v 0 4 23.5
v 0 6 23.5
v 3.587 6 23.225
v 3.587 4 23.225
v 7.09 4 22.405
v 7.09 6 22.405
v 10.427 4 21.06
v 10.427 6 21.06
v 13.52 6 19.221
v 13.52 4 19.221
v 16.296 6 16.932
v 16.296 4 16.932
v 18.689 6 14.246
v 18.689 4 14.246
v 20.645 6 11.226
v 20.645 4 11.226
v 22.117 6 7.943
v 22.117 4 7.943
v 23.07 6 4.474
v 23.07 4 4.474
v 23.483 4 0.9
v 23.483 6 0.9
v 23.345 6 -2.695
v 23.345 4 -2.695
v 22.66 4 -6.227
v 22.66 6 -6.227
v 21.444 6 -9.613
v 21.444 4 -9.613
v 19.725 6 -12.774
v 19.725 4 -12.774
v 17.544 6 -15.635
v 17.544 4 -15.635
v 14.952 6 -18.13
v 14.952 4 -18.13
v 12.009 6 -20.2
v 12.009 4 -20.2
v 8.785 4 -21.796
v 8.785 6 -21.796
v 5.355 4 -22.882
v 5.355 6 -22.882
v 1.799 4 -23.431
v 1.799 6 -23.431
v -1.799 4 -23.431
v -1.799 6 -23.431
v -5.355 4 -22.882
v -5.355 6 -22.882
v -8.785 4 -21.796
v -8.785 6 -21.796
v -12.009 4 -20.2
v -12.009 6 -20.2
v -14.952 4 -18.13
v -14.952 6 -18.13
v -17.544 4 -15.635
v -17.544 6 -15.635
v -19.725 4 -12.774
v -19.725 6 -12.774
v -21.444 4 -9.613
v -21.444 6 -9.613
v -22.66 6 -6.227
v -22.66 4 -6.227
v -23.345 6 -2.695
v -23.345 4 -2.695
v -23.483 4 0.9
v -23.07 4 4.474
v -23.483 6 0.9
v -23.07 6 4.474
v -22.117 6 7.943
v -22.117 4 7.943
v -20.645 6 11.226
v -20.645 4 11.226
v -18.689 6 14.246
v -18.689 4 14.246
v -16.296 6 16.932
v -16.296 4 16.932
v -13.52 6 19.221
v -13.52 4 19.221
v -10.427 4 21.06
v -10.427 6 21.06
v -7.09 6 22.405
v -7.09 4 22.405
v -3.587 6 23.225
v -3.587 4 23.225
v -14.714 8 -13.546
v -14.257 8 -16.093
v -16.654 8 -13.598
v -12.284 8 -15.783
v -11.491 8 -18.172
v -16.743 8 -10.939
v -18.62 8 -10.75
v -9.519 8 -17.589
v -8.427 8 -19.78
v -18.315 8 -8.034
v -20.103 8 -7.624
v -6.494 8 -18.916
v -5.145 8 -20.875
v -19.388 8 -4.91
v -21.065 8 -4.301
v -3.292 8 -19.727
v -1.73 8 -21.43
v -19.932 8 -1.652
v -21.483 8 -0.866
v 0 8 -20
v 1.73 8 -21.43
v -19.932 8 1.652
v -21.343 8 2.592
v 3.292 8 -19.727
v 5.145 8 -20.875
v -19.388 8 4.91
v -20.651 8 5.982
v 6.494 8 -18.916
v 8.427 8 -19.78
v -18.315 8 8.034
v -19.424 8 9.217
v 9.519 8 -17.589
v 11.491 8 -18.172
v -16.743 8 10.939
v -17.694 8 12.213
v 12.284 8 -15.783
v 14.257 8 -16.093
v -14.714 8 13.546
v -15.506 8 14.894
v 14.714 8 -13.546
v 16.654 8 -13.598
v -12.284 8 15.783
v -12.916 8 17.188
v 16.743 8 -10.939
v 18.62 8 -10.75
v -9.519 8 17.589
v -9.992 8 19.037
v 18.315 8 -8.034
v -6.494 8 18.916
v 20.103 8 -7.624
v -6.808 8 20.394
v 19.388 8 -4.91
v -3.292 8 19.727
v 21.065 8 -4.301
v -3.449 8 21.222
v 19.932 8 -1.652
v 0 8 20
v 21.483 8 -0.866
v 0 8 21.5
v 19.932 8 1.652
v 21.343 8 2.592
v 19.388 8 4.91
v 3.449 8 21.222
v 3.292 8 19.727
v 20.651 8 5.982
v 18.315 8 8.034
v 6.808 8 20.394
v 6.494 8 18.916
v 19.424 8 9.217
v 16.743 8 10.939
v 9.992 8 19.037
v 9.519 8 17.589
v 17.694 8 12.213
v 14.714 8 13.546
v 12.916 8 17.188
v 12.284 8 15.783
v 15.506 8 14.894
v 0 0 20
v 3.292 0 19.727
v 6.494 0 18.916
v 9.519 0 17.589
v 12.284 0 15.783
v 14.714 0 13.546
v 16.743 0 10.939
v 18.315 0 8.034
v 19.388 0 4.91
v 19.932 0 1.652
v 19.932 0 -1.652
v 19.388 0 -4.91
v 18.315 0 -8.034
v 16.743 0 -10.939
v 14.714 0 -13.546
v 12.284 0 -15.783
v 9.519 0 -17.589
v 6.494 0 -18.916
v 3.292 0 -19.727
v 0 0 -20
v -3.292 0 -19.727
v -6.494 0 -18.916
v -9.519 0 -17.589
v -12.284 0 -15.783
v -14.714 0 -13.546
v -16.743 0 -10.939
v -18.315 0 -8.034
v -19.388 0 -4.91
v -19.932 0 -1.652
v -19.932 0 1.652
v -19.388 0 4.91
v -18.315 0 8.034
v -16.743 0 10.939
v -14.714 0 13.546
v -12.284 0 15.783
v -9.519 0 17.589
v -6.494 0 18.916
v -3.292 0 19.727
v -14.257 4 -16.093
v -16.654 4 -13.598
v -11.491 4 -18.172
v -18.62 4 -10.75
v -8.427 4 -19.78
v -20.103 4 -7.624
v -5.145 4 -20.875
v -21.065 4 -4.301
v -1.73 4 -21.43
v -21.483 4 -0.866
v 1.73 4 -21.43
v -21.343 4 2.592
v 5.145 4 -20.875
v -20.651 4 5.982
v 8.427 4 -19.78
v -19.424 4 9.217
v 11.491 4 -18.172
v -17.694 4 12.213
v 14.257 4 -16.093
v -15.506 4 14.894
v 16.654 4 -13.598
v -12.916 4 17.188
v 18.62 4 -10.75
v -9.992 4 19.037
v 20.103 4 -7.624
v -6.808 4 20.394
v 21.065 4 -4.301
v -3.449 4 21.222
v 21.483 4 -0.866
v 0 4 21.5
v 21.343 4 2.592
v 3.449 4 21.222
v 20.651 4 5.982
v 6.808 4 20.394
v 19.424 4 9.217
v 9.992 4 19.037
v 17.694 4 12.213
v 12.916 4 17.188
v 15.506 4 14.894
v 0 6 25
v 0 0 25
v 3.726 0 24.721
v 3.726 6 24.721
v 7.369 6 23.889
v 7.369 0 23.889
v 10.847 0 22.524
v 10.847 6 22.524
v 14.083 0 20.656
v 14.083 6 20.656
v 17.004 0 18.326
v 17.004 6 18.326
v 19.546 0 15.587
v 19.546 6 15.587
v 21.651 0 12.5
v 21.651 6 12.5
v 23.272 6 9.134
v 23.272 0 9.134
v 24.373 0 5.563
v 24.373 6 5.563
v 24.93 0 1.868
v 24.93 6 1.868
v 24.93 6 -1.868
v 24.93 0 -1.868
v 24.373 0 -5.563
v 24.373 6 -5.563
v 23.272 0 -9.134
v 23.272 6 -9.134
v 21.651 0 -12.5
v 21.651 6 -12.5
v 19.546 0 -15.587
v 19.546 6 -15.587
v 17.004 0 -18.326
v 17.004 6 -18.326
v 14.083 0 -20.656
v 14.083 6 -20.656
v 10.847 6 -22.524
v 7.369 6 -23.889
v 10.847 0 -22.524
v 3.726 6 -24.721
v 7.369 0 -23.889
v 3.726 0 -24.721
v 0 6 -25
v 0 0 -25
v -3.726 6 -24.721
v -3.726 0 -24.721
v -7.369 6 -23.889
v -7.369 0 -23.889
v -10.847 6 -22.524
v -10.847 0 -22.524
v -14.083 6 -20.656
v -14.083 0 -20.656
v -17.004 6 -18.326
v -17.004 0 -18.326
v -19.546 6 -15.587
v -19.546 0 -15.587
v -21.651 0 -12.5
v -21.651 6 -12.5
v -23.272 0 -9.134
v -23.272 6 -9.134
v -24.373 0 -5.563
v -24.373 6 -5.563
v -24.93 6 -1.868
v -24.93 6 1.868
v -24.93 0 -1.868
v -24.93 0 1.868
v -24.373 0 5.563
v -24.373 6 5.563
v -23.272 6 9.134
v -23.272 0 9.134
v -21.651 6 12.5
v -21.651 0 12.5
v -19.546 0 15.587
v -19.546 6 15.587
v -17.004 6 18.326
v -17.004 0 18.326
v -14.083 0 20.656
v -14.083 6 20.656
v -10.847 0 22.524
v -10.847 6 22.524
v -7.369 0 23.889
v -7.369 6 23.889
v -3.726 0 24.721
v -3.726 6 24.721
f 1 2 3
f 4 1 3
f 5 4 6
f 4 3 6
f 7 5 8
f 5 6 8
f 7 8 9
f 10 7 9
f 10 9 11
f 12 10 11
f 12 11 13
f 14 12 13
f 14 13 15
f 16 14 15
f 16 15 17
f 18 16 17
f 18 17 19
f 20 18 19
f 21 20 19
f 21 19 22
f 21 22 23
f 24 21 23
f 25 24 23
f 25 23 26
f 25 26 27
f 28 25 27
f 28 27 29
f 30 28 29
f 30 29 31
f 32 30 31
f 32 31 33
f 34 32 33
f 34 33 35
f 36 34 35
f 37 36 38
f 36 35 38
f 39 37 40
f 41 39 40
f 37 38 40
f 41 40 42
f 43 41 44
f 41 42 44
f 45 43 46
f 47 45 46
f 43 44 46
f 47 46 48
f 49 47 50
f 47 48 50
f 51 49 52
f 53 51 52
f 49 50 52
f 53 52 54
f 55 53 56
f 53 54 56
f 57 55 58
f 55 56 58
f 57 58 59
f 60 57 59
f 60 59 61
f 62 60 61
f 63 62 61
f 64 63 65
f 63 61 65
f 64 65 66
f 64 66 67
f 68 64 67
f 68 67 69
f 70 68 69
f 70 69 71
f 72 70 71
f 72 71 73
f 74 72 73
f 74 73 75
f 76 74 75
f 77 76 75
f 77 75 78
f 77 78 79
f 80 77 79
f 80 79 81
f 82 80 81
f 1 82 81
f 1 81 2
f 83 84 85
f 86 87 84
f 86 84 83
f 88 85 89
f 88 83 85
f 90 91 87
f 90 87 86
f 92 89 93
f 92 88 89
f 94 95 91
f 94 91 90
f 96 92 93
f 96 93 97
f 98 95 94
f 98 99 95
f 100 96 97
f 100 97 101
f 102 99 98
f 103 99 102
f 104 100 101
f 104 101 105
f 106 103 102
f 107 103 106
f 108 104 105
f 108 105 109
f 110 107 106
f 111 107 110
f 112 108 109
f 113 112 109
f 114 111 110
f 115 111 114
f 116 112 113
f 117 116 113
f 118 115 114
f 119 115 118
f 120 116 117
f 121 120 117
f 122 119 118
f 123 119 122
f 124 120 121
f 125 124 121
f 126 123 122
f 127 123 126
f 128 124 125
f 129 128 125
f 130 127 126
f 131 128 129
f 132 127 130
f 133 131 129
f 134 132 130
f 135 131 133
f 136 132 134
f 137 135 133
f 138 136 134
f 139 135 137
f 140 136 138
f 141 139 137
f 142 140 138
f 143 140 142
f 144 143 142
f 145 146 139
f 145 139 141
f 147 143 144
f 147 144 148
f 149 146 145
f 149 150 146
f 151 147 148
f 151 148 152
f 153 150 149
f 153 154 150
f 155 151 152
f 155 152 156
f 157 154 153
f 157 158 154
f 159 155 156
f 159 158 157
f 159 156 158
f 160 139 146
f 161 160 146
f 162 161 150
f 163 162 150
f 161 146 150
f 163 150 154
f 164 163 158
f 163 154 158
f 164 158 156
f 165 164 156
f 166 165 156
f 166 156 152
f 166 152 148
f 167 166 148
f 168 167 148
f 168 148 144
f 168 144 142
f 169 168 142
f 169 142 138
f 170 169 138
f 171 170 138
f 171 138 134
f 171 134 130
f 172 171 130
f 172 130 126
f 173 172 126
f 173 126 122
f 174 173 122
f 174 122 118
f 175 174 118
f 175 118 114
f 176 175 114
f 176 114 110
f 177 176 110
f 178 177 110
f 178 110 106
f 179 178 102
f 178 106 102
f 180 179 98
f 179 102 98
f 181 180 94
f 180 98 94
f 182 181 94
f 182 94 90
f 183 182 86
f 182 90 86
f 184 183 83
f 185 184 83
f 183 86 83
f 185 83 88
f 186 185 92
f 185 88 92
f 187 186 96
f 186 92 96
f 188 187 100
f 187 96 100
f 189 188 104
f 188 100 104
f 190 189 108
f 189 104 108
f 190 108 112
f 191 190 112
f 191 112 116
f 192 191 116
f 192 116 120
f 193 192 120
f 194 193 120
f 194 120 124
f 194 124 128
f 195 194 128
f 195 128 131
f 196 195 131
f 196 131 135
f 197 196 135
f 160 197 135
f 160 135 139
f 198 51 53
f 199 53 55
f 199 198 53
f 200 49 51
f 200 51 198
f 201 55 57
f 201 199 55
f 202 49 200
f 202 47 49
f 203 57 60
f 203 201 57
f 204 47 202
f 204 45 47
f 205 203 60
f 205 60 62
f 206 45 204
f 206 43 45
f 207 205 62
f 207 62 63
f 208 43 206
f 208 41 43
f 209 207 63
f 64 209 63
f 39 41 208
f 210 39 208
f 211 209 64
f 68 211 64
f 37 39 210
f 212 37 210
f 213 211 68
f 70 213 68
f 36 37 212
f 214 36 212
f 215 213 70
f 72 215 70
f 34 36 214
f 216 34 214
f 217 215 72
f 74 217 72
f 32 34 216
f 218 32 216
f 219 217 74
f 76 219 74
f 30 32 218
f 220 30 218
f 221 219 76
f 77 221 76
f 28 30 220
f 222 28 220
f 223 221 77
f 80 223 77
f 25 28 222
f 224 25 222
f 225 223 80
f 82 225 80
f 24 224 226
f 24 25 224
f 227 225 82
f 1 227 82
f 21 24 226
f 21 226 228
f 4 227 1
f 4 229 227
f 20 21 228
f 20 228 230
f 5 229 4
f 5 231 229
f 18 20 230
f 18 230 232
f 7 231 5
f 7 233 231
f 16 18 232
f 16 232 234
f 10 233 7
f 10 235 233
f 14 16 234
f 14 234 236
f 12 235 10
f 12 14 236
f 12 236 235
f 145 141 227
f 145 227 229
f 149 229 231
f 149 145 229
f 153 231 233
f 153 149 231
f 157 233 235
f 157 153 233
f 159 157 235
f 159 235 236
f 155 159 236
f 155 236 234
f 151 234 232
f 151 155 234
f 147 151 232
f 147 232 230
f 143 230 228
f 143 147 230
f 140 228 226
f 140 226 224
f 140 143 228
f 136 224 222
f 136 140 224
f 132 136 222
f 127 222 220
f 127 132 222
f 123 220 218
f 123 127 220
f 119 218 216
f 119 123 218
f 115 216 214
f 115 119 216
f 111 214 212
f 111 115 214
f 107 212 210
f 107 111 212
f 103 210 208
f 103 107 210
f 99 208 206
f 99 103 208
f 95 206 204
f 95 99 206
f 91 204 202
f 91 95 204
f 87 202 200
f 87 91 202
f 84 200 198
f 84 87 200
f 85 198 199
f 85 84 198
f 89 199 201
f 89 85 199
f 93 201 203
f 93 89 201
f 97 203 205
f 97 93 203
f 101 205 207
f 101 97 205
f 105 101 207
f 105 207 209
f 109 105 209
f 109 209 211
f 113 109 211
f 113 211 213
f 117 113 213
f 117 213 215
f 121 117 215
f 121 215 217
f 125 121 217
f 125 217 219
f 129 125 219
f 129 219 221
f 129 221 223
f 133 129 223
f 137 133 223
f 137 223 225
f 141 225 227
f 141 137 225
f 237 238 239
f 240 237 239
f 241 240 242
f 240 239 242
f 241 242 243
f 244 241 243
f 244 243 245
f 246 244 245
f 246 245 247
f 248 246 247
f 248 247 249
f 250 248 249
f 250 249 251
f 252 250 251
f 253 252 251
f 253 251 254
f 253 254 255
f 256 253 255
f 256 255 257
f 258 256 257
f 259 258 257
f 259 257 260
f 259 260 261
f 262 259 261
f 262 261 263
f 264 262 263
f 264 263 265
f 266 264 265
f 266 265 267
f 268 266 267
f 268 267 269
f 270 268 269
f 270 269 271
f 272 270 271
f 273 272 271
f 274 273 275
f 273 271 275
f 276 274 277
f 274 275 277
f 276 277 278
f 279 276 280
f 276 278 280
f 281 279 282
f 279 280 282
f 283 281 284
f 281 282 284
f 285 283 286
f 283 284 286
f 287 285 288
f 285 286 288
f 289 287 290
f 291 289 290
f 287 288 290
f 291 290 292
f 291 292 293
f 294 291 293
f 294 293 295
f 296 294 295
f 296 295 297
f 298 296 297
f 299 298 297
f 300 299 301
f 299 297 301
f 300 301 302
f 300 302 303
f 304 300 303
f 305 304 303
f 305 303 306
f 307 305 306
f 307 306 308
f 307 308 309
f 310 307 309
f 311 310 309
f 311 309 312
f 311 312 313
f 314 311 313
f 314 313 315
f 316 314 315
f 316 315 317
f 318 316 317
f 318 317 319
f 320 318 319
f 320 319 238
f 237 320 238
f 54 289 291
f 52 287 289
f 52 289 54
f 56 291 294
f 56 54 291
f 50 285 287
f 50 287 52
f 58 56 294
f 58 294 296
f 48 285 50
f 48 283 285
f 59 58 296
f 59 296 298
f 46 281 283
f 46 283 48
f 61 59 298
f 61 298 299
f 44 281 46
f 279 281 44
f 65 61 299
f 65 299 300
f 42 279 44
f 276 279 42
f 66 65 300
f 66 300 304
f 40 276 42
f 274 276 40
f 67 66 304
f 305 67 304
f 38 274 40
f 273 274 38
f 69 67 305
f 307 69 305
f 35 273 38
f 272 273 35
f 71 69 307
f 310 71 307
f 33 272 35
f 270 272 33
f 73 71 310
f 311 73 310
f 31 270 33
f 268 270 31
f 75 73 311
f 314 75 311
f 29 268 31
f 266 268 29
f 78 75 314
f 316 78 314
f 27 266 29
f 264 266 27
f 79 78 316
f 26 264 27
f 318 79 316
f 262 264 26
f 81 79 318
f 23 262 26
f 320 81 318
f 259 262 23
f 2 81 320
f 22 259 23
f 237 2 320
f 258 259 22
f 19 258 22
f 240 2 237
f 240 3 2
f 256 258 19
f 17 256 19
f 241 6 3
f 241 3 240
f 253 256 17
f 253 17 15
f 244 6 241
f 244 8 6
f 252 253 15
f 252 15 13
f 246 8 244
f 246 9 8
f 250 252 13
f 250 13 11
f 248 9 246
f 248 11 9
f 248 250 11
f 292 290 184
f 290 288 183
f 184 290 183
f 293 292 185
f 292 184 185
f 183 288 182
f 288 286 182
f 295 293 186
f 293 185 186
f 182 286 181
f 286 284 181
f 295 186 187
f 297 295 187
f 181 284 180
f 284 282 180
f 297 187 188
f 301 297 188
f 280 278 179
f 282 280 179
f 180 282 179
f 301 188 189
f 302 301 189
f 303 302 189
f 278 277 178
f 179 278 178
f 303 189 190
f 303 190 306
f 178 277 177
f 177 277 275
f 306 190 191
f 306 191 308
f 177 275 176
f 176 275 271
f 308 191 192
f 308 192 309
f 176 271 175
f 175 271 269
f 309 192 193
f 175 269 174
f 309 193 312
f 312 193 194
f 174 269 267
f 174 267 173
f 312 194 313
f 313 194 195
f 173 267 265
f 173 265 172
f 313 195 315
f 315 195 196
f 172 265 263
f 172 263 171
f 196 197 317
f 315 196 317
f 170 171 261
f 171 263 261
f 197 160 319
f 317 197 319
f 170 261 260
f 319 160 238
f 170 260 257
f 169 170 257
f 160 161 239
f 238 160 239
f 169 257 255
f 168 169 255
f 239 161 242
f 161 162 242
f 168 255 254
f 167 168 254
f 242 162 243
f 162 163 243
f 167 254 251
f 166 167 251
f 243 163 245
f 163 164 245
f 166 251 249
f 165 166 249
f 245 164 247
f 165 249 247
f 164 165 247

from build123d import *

# Parameters (mm, degrees)
SKETCH1_R           = 25
BOSS_EXTRUDE1_DEPTH = 8
SKETCH2_R           = 23.5
SKETCH2_R_2         = 21.5
CUT_EXTRUDE1_DEPTH  = 4
SKETCH3_R           = 25
SKETCH3_R_2         = 23.5
CUT_EXTRUDE2_DEPTH  = 2
CUT_EXTRUDE3_REACH  = 38.249
SKETCH4_R           = 20


with BuildPart() as part:
    # Sketch1 → Boss-Extrude1 (new body)
    with BuildSketch(Plane(origin=(0, 0, 0), x_dir=(1, 0, 0), z_dir=(0, 1, 0))):
        with Locations(Location((0, 0, 0), (0, 0, 270))):
            Circle(SKETCH1_R)
    extrude(amount=BOSS_EXTRUDE1_DEPTH)

    # Sketch2 → Cut-Extrude1 (cut)
    with BuildSketch(Plane(origin=(0, 8, 0), x_dir=(1, 0, 0), z_dir=(0, 1, 0))):
        with Locations(Location((0, 0, 0), (0, 0, 270))):
            Circle(SKETCH2_R)
        with Locations(Location((0, 0, 0), (0, 0, 270))):
            Circle(SKETCH2_R_2, mode=Mode.SUBTRACT)
    extrude(amount=-CUT_EXTRUDE1_DEPTH, mode=Mode.SUBTRACT)

    # Sketch3 → Cut-Extrude2 (cut)
    with BuildSketch(Plane(origin=(0, 8, 0), x_dir=(1, 0, 0), z_dir=(0, 1, 0))):
        with Locations(Location((0, 0, 0), (0, 0, 270))):
            Circle(SKETCH3_R)
        with Locations(Location((0, 0, 0), (0, 0, 270))):
            Circle(SKETCH3_R_2, mode=Mode.SUBTRACT)
    extrude(amount=-CUT_EXTRUDE2_DEPTH, mode=Mode.SUBTRACT)

    # Sketch4 → Cut-Extrude3 (cut, up to next)
    with BuildSketch(Plane(origin=(0, 8, 0), x_dir=(1, 0, 0), z_dir=(0, 1, 0)), mode=Mode.PRIVATE) as cut_extrude3_sk1:
        with Locations(Location((0, 0, 0), (0, 0, 270))):
            Circle(SKETCH4_R)
    cut_extrude3_tool1 = extrude(cut_extrude3_sk1.sketch, amount=-CUT_EXTRUDE3_REACH, mode=Mode.PRIVATE) & part.part
    add(cut_extrude3_tool1.solids().sort_by_distance((0, 8, 0))[0], mode=Mode.SUBTRACT)


solid = part.part
